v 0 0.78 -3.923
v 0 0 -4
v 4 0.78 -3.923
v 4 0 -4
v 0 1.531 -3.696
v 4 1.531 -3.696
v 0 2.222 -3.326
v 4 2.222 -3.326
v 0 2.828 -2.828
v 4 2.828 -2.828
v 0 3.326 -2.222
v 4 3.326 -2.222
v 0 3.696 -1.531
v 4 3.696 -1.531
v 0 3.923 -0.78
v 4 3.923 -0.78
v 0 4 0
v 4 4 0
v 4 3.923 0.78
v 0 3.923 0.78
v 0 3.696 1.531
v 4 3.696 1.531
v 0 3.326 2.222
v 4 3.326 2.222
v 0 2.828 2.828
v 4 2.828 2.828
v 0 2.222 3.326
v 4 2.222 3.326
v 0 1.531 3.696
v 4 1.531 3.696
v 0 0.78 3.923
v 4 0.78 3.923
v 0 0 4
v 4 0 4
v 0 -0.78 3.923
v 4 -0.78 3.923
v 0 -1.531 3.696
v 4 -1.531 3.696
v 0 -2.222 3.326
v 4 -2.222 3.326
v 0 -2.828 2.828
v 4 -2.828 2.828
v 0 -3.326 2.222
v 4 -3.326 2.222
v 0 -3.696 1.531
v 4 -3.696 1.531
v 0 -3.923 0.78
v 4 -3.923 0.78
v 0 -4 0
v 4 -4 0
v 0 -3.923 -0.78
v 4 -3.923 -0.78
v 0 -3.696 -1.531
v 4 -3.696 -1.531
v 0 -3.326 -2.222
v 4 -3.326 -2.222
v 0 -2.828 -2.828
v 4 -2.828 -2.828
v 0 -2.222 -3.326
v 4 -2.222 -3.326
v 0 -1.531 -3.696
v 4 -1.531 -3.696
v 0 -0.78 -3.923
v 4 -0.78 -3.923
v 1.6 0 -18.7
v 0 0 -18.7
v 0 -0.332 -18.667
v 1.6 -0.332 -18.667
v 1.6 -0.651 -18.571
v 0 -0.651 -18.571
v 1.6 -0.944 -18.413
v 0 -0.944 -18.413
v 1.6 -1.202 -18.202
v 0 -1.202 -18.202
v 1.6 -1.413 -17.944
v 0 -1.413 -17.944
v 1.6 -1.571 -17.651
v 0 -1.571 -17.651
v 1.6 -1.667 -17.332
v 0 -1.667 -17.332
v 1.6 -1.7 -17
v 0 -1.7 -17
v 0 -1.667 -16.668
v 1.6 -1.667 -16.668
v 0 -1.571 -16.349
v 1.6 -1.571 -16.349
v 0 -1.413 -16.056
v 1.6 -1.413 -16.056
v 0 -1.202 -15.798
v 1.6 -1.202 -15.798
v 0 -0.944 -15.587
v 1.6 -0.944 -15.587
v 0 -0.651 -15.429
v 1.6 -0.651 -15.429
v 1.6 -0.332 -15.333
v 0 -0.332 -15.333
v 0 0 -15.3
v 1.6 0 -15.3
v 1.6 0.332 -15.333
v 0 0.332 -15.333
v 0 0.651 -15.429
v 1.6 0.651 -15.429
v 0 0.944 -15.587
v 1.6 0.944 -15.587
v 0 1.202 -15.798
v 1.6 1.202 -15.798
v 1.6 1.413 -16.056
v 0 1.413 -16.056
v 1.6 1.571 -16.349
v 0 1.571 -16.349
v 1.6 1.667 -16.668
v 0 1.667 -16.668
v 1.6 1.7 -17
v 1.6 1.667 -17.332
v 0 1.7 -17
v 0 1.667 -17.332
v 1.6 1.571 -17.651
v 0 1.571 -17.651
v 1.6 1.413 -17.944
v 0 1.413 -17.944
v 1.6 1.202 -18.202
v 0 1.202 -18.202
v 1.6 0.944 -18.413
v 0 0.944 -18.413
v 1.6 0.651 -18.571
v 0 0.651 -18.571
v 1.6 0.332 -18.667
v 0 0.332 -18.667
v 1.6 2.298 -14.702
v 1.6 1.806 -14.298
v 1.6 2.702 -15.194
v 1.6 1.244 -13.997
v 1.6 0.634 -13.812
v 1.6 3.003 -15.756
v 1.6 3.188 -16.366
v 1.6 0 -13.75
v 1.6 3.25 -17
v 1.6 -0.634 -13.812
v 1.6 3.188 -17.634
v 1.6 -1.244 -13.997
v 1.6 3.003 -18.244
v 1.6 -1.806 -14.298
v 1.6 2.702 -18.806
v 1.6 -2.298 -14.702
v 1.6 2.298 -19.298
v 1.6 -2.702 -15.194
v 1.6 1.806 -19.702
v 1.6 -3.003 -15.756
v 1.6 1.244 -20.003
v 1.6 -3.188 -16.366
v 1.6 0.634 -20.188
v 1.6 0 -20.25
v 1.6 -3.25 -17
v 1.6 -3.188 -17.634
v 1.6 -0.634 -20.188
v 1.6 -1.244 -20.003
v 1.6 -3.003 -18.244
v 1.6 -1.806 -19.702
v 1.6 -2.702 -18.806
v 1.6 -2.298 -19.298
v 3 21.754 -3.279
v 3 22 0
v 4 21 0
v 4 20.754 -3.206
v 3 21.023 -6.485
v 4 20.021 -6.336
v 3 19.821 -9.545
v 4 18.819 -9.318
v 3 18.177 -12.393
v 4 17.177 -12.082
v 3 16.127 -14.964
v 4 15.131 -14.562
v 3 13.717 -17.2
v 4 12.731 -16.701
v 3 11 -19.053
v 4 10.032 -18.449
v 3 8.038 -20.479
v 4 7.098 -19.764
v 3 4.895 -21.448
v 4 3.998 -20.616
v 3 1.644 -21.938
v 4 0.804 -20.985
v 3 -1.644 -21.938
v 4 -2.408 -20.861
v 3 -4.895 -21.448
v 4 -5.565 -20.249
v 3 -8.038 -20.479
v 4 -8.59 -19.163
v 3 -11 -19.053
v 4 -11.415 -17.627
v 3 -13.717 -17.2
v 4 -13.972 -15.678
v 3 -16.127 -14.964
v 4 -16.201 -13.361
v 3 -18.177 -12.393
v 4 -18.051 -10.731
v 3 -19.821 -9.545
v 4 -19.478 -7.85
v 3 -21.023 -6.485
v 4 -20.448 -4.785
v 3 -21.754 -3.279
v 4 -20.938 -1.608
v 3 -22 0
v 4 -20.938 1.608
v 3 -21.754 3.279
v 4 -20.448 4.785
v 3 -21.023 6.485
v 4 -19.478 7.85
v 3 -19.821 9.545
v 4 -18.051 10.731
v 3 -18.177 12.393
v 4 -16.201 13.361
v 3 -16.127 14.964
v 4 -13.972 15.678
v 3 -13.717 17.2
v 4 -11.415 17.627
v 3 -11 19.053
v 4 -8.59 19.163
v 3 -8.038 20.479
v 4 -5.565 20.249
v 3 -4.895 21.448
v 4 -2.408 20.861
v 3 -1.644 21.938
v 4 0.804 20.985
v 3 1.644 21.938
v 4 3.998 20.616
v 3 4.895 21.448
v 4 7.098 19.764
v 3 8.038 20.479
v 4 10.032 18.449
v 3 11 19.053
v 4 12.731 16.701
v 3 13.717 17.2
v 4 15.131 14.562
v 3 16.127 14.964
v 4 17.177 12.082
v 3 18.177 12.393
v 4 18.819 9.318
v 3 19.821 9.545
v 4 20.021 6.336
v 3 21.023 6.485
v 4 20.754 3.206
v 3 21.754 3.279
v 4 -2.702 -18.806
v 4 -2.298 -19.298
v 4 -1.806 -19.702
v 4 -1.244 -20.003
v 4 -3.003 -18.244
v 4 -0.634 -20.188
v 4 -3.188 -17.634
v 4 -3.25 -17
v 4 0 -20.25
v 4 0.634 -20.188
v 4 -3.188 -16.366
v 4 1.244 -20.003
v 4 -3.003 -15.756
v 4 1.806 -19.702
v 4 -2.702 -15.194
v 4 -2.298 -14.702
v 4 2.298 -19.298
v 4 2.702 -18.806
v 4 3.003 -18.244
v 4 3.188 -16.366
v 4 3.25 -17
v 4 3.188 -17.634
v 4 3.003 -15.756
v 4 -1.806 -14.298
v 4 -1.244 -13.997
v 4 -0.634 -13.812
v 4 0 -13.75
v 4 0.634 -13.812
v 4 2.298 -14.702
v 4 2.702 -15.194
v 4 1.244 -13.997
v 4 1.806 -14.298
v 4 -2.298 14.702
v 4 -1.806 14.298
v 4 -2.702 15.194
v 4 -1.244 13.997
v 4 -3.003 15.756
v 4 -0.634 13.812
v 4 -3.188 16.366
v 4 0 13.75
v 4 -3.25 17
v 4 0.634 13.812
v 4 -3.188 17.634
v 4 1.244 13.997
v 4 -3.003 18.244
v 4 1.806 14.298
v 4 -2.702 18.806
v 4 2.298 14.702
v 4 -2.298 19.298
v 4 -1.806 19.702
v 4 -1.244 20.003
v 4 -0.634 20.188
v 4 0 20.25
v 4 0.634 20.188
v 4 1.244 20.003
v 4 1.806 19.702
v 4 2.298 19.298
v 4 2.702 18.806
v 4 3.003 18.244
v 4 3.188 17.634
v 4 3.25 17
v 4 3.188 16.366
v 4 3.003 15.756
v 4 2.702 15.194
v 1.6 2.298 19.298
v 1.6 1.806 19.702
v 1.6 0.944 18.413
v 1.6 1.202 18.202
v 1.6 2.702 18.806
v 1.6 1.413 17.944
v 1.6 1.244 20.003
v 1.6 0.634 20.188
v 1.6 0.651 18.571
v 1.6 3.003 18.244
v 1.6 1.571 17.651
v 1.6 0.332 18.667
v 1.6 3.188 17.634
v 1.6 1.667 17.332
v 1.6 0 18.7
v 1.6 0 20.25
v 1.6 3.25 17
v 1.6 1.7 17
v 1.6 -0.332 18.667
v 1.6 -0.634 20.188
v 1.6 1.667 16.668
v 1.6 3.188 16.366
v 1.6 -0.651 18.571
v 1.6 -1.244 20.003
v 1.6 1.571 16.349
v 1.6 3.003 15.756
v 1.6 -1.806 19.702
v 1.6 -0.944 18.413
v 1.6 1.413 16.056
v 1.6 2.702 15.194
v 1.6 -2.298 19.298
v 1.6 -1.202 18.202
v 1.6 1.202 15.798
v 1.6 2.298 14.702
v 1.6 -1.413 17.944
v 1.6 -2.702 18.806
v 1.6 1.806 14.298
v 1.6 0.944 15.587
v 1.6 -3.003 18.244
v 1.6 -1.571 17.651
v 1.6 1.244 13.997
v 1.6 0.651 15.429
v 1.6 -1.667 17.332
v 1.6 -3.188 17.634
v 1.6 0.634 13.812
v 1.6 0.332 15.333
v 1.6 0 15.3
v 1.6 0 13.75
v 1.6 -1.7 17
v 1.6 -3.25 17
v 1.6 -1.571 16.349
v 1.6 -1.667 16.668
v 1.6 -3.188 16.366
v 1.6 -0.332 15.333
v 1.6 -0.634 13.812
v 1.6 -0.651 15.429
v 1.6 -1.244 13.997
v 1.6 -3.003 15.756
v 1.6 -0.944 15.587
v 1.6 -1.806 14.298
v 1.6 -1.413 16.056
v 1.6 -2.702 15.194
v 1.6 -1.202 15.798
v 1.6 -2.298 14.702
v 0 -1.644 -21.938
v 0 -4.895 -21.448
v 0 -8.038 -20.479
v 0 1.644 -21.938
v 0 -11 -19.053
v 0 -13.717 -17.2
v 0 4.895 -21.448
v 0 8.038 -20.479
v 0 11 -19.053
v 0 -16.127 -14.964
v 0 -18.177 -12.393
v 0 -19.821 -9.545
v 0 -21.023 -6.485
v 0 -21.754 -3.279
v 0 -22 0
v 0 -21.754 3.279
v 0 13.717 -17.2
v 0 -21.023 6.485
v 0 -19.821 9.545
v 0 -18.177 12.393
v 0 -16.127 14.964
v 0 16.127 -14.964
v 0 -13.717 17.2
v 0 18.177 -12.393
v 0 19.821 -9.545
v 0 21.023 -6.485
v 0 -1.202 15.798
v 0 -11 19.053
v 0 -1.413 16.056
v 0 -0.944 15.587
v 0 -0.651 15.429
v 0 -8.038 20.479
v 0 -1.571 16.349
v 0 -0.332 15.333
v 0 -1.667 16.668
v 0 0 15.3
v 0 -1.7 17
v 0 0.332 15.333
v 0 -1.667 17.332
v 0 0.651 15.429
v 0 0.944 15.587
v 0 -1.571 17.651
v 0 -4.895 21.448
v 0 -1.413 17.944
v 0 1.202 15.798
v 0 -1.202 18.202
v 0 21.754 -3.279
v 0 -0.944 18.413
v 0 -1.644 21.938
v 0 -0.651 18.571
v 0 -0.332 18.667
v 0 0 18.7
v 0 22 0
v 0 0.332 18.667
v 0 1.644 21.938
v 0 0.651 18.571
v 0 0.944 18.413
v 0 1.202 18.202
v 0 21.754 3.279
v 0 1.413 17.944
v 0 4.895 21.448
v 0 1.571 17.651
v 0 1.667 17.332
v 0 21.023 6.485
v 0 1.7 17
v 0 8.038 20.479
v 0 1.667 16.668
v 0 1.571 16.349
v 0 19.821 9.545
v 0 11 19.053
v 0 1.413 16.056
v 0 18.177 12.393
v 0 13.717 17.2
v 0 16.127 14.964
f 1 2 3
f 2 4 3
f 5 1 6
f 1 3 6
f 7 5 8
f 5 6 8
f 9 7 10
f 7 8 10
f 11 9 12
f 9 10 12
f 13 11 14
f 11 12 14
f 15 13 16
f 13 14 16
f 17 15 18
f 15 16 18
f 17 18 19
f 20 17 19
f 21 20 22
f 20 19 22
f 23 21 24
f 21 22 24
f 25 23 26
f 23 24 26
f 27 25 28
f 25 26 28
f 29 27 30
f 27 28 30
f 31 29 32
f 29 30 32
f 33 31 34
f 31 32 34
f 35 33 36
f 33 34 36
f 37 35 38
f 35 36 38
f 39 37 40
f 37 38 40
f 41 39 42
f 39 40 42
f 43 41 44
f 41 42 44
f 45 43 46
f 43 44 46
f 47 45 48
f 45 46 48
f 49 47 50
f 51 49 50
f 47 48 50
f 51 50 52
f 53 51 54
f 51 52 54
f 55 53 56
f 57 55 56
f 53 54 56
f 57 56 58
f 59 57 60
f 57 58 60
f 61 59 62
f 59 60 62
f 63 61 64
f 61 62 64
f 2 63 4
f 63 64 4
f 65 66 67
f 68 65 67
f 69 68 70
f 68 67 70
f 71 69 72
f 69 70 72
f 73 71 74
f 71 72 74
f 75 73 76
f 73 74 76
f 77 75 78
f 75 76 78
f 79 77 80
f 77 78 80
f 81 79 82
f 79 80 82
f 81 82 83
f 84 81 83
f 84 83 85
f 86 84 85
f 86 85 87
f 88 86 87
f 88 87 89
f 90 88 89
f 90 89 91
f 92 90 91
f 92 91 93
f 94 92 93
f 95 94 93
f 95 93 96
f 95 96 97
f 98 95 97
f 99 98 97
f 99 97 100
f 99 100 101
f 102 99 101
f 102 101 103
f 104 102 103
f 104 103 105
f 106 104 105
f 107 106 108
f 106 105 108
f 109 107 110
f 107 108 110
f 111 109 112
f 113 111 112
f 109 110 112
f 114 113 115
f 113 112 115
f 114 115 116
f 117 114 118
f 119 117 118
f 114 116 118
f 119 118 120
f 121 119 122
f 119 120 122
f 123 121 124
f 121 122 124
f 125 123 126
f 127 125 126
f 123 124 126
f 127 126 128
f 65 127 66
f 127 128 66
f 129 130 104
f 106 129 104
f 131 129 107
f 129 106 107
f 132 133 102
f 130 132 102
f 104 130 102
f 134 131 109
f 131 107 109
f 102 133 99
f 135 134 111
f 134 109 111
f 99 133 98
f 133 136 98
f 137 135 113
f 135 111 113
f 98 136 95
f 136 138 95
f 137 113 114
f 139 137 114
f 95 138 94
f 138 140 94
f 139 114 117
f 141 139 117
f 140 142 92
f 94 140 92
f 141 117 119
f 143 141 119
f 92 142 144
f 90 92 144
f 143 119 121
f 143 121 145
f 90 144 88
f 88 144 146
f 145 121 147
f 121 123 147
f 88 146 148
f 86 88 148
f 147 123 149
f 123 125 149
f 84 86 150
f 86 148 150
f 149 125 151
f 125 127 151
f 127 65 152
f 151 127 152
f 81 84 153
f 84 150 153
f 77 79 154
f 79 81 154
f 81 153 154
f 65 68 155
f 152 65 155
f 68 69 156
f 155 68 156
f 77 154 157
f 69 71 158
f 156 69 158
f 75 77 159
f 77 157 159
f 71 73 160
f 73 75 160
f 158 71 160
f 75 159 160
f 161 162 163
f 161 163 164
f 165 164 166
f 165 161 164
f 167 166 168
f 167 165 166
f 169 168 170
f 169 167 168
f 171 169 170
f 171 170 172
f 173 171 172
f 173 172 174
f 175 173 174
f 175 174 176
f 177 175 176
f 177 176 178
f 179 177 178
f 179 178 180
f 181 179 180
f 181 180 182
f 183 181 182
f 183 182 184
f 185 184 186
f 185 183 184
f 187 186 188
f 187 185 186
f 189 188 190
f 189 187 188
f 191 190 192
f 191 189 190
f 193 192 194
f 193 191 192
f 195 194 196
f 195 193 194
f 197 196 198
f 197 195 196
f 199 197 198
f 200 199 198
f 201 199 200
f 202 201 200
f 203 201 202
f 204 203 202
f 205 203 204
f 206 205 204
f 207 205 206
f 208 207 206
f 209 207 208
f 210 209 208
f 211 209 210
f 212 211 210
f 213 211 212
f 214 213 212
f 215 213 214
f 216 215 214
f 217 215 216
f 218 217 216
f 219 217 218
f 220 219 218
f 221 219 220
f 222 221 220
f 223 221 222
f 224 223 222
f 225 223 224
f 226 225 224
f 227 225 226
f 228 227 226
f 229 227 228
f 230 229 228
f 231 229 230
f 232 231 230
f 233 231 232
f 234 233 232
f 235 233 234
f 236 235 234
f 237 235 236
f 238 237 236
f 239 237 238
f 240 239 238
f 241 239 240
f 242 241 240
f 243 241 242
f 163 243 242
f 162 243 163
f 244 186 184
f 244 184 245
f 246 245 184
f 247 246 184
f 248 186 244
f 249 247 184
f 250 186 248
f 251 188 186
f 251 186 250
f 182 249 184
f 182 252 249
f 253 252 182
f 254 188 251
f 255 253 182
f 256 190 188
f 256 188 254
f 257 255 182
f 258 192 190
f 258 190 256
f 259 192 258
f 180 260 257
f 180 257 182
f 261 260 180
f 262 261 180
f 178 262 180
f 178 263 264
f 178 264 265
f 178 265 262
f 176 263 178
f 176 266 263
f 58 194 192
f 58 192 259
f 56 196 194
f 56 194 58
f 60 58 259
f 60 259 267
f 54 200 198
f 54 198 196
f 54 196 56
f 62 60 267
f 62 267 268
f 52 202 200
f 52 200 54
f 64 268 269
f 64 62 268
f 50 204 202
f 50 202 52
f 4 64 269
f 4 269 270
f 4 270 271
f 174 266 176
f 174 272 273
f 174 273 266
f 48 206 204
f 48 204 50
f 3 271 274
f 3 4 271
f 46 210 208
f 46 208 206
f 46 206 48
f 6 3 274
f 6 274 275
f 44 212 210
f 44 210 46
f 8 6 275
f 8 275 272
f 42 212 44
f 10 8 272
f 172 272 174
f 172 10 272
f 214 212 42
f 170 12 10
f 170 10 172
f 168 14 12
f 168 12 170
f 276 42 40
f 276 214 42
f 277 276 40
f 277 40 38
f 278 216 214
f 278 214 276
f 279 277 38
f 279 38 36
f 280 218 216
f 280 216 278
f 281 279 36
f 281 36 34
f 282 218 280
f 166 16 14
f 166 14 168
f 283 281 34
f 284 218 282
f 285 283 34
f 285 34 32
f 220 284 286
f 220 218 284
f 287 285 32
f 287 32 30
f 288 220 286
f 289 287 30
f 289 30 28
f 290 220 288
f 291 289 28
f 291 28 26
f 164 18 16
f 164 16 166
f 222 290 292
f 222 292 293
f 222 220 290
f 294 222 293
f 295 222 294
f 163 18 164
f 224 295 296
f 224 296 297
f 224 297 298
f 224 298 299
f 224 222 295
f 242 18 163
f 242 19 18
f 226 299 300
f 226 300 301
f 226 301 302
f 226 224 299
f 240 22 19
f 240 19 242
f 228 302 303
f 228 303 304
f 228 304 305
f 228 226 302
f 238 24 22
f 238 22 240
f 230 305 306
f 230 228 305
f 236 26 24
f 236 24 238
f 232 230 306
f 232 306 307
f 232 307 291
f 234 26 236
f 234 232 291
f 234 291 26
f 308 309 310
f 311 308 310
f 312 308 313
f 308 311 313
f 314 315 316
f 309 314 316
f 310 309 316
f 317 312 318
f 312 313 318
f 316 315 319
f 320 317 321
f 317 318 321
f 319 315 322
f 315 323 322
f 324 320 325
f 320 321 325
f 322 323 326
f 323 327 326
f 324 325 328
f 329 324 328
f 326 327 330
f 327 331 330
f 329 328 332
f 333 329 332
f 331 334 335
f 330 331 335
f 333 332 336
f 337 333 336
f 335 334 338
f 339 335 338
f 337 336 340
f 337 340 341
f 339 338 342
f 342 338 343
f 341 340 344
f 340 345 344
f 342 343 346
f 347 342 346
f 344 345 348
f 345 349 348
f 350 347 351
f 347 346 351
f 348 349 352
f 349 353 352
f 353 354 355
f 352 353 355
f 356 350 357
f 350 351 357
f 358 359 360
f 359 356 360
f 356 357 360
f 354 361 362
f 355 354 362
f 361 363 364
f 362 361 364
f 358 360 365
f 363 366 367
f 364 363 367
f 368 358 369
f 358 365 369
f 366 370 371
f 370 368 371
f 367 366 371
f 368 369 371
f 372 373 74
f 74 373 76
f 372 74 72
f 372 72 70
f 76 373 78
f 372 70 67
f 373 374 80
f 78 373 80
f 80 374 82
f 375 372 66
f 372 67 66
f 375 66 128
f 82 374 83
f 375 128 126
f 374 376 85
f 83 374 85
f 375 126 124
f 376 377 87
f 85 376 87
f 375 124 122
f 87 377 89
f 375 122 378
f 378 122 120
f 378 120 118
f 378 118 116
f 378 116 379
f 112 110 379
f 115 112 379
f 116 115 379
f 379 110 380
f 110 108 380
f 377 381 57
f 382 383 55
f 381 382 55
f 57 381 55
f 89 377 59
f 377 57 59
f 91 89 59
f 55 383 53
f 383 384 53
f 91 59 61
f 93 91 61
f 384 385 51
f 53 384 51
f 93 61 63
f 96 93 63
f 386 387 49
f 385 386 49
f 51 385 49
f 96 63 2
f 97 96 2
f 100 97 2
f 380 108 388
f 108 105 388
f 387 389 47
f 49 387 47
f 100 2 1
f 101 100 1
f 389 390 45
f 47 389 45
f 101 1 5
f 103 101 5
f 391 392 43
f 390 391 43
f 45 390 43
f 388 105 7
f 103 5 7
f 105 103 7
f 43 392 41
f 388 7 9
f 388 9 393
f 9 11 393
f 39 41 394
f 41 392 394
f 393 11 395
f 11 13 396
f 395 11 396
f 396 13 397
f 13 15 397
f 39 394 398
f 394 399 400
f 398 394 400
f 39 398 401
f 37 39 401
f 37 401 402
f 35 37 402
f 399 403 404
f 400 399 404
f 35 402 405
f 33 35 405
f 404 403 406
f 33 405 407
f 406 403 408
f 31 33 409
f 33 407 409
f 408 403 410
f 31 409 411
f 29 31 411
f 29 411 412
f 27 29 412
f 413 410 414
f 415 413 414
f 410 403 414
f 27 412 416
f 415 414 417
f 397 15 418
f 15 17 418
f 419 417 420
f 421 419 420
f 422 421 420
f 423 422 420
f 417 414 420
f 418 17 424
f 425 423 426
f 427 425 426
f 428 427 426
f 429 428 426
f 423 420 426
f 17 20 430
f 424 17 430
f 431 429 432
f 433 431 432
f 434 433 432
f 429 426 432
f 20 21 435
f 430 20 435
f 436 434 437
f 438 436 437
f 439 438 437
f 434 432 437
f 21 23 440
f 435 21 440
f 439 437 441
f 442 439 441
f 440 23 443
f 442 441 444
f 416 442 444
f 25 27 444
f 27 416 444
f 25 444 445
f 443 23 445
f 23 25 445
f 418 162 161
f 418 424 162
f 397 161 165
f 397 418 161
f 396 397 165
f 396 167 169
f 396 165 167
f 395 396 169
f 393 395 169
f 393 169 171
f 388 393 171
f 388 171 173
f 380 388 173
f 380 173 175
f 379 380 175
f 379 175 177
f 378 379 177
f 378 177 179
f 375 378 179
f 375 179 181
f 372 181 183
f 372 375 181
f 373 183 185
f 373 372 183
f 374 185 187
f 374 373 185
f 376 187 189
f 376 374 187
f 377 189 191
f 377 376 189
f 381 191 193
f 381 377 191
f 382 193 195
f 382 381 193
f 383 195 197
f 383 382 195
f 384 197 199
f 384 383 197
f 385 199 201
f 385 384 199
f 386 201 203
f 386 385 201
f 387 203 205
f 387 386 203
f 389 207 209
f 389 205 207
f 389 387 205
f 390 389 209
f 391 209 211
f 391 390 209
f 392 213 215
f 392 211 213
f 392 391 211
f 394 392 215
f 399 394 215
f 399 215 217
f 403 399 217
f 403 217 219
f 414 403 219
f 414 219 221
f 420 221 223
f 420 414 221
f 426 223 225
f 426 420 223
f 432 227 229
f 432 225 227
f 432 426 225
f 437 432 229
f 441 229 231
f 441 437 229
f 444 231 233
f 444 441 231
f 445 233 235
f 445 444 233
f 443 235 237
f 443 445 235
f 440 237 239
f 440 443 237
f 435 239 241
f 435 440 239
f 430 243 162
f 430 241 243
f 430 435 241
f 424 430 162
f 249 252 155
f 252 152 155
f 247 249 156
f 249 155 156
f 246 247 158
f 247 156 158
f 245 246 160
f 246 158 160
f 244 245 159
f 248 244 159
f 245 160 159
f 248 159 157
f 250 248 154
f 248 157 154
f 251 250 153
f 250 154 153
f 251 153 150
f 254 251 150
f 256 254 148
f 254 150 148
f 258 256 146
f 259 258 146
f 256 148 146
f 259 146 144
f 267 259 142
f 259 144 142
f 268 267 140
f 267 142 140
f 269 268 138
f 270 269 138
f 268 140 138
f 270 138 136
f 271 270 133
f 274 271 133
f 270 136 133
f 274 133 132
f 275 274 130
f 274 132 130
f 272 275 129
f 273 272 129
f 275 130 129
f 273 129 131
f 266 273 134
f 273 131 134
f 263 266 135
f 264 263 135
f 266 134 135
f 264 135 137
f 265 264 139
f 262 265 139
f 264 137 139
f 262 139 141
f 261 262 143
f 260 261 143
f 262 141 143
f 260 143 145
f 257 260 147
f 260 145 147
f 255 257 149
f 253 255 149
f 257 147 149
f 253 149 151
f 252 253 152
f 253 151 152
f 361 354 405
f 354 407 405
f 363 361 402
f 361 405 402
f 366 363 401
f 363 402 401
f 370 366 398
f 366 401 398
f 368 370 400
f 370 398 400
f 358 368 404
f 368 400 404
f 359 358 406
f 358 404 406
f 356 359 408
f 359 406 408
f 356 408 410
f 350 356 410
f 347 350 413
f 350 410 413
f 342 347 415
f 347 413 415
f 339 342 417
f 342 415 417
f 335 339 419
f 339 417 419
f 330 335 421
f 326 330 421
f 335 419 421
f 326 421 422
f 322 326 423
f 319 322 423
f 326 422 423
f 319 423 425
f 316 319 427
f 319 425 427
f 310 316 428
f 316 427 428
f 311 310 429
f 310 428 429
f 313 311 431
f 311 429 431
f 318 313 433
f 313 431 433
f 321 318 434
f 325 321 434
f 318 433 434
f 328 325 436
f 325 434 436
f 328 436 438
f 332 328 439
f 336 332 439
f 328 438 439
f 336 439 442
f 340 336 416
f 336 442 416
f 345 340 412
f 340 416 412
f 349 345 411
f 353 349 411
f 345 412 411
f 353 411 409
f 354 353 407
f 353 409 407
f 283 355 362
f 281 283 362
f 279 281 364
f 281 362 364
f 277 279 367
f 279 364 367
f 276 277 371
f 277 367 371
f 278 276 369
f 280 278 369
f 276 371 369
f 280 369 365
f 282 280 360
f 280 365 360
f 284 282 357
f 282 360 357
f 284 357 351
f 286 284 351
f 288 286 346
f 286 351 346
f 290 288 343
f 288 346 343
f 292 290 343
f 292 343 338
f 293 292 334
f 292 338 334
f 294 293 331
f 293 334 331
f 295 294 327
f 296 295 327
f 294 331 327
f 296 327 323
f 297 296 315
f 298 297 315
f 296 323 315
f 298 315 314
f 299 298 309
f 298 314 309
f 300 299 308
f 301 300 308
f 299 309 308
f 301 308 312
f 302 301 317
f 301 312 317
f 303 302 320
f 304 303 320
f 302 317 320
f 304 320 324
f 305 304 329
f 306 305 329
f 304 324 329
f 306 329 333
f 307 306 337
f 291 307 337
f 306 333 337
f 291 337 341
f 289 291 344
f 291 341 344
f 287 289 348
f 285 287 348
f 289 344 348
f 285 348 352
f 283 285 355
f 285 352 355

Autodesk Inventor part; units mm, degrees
ref_plane "YZ Plane" through (0, 0, 0) normal (1, 0, 0) x (0, 1, 0)
ref_plane "XZ Plane" through (0, 0, 0) normal (0, 1, 0) x (-1, 0, 0)
ref_plane "XY Plane" through (0, 0, 0) normal (0, 0, 1) x (1, 0, 0)
sketch "Sketch1" plane through (0, 0, 0) normal (1, 0, 0) x (0, 1, 0)
  circle A0 centre (0, 0) radius 22
  dimension "d0" = 44
extrude "Extrusion1" add sketch "Sketch1" along normal blind 4
sketch "Sketch2" plane through (4, 0, 0) normal (1, 0, 0) x (0, 0, -1)
  circle A0 centre (-17, 0) radius 1.5
  circle A1 centre (17, 0) radius 1.5
  point P0 (0, 0)
  dimension "d3" = 3
  dimension "d4" = 3
  dimension "d5" = 34
  dimension "d6" = 17
hole "Hole1" at (4, 0, 17) at (4, 0, -17) direction (-1, 0, 0) diameter 3.4 depth 8.8 tip angle 118 counterbore diameter 6.5 counterbore depth 2.4 clearance for "Slotted Cheese Head Screw ISO 1207" size "M3" standard "ISO"
sketch "Sketch3" plane through (4, 0, 0) normal (1, 0, 0) x (0, 0, -1)
  circle A0 centre (0, 0) radius 4
  dimension "d14" = 8
extrude "Extrusion2" cut sketch "Sketch3" against normal blind 4
chamfer "Chamfer1" distance 1 angle 45 1 edges at (4, -22, 0)
equation "\"d6\" = 0.5 * d5"
properties part number "kołmierz"
